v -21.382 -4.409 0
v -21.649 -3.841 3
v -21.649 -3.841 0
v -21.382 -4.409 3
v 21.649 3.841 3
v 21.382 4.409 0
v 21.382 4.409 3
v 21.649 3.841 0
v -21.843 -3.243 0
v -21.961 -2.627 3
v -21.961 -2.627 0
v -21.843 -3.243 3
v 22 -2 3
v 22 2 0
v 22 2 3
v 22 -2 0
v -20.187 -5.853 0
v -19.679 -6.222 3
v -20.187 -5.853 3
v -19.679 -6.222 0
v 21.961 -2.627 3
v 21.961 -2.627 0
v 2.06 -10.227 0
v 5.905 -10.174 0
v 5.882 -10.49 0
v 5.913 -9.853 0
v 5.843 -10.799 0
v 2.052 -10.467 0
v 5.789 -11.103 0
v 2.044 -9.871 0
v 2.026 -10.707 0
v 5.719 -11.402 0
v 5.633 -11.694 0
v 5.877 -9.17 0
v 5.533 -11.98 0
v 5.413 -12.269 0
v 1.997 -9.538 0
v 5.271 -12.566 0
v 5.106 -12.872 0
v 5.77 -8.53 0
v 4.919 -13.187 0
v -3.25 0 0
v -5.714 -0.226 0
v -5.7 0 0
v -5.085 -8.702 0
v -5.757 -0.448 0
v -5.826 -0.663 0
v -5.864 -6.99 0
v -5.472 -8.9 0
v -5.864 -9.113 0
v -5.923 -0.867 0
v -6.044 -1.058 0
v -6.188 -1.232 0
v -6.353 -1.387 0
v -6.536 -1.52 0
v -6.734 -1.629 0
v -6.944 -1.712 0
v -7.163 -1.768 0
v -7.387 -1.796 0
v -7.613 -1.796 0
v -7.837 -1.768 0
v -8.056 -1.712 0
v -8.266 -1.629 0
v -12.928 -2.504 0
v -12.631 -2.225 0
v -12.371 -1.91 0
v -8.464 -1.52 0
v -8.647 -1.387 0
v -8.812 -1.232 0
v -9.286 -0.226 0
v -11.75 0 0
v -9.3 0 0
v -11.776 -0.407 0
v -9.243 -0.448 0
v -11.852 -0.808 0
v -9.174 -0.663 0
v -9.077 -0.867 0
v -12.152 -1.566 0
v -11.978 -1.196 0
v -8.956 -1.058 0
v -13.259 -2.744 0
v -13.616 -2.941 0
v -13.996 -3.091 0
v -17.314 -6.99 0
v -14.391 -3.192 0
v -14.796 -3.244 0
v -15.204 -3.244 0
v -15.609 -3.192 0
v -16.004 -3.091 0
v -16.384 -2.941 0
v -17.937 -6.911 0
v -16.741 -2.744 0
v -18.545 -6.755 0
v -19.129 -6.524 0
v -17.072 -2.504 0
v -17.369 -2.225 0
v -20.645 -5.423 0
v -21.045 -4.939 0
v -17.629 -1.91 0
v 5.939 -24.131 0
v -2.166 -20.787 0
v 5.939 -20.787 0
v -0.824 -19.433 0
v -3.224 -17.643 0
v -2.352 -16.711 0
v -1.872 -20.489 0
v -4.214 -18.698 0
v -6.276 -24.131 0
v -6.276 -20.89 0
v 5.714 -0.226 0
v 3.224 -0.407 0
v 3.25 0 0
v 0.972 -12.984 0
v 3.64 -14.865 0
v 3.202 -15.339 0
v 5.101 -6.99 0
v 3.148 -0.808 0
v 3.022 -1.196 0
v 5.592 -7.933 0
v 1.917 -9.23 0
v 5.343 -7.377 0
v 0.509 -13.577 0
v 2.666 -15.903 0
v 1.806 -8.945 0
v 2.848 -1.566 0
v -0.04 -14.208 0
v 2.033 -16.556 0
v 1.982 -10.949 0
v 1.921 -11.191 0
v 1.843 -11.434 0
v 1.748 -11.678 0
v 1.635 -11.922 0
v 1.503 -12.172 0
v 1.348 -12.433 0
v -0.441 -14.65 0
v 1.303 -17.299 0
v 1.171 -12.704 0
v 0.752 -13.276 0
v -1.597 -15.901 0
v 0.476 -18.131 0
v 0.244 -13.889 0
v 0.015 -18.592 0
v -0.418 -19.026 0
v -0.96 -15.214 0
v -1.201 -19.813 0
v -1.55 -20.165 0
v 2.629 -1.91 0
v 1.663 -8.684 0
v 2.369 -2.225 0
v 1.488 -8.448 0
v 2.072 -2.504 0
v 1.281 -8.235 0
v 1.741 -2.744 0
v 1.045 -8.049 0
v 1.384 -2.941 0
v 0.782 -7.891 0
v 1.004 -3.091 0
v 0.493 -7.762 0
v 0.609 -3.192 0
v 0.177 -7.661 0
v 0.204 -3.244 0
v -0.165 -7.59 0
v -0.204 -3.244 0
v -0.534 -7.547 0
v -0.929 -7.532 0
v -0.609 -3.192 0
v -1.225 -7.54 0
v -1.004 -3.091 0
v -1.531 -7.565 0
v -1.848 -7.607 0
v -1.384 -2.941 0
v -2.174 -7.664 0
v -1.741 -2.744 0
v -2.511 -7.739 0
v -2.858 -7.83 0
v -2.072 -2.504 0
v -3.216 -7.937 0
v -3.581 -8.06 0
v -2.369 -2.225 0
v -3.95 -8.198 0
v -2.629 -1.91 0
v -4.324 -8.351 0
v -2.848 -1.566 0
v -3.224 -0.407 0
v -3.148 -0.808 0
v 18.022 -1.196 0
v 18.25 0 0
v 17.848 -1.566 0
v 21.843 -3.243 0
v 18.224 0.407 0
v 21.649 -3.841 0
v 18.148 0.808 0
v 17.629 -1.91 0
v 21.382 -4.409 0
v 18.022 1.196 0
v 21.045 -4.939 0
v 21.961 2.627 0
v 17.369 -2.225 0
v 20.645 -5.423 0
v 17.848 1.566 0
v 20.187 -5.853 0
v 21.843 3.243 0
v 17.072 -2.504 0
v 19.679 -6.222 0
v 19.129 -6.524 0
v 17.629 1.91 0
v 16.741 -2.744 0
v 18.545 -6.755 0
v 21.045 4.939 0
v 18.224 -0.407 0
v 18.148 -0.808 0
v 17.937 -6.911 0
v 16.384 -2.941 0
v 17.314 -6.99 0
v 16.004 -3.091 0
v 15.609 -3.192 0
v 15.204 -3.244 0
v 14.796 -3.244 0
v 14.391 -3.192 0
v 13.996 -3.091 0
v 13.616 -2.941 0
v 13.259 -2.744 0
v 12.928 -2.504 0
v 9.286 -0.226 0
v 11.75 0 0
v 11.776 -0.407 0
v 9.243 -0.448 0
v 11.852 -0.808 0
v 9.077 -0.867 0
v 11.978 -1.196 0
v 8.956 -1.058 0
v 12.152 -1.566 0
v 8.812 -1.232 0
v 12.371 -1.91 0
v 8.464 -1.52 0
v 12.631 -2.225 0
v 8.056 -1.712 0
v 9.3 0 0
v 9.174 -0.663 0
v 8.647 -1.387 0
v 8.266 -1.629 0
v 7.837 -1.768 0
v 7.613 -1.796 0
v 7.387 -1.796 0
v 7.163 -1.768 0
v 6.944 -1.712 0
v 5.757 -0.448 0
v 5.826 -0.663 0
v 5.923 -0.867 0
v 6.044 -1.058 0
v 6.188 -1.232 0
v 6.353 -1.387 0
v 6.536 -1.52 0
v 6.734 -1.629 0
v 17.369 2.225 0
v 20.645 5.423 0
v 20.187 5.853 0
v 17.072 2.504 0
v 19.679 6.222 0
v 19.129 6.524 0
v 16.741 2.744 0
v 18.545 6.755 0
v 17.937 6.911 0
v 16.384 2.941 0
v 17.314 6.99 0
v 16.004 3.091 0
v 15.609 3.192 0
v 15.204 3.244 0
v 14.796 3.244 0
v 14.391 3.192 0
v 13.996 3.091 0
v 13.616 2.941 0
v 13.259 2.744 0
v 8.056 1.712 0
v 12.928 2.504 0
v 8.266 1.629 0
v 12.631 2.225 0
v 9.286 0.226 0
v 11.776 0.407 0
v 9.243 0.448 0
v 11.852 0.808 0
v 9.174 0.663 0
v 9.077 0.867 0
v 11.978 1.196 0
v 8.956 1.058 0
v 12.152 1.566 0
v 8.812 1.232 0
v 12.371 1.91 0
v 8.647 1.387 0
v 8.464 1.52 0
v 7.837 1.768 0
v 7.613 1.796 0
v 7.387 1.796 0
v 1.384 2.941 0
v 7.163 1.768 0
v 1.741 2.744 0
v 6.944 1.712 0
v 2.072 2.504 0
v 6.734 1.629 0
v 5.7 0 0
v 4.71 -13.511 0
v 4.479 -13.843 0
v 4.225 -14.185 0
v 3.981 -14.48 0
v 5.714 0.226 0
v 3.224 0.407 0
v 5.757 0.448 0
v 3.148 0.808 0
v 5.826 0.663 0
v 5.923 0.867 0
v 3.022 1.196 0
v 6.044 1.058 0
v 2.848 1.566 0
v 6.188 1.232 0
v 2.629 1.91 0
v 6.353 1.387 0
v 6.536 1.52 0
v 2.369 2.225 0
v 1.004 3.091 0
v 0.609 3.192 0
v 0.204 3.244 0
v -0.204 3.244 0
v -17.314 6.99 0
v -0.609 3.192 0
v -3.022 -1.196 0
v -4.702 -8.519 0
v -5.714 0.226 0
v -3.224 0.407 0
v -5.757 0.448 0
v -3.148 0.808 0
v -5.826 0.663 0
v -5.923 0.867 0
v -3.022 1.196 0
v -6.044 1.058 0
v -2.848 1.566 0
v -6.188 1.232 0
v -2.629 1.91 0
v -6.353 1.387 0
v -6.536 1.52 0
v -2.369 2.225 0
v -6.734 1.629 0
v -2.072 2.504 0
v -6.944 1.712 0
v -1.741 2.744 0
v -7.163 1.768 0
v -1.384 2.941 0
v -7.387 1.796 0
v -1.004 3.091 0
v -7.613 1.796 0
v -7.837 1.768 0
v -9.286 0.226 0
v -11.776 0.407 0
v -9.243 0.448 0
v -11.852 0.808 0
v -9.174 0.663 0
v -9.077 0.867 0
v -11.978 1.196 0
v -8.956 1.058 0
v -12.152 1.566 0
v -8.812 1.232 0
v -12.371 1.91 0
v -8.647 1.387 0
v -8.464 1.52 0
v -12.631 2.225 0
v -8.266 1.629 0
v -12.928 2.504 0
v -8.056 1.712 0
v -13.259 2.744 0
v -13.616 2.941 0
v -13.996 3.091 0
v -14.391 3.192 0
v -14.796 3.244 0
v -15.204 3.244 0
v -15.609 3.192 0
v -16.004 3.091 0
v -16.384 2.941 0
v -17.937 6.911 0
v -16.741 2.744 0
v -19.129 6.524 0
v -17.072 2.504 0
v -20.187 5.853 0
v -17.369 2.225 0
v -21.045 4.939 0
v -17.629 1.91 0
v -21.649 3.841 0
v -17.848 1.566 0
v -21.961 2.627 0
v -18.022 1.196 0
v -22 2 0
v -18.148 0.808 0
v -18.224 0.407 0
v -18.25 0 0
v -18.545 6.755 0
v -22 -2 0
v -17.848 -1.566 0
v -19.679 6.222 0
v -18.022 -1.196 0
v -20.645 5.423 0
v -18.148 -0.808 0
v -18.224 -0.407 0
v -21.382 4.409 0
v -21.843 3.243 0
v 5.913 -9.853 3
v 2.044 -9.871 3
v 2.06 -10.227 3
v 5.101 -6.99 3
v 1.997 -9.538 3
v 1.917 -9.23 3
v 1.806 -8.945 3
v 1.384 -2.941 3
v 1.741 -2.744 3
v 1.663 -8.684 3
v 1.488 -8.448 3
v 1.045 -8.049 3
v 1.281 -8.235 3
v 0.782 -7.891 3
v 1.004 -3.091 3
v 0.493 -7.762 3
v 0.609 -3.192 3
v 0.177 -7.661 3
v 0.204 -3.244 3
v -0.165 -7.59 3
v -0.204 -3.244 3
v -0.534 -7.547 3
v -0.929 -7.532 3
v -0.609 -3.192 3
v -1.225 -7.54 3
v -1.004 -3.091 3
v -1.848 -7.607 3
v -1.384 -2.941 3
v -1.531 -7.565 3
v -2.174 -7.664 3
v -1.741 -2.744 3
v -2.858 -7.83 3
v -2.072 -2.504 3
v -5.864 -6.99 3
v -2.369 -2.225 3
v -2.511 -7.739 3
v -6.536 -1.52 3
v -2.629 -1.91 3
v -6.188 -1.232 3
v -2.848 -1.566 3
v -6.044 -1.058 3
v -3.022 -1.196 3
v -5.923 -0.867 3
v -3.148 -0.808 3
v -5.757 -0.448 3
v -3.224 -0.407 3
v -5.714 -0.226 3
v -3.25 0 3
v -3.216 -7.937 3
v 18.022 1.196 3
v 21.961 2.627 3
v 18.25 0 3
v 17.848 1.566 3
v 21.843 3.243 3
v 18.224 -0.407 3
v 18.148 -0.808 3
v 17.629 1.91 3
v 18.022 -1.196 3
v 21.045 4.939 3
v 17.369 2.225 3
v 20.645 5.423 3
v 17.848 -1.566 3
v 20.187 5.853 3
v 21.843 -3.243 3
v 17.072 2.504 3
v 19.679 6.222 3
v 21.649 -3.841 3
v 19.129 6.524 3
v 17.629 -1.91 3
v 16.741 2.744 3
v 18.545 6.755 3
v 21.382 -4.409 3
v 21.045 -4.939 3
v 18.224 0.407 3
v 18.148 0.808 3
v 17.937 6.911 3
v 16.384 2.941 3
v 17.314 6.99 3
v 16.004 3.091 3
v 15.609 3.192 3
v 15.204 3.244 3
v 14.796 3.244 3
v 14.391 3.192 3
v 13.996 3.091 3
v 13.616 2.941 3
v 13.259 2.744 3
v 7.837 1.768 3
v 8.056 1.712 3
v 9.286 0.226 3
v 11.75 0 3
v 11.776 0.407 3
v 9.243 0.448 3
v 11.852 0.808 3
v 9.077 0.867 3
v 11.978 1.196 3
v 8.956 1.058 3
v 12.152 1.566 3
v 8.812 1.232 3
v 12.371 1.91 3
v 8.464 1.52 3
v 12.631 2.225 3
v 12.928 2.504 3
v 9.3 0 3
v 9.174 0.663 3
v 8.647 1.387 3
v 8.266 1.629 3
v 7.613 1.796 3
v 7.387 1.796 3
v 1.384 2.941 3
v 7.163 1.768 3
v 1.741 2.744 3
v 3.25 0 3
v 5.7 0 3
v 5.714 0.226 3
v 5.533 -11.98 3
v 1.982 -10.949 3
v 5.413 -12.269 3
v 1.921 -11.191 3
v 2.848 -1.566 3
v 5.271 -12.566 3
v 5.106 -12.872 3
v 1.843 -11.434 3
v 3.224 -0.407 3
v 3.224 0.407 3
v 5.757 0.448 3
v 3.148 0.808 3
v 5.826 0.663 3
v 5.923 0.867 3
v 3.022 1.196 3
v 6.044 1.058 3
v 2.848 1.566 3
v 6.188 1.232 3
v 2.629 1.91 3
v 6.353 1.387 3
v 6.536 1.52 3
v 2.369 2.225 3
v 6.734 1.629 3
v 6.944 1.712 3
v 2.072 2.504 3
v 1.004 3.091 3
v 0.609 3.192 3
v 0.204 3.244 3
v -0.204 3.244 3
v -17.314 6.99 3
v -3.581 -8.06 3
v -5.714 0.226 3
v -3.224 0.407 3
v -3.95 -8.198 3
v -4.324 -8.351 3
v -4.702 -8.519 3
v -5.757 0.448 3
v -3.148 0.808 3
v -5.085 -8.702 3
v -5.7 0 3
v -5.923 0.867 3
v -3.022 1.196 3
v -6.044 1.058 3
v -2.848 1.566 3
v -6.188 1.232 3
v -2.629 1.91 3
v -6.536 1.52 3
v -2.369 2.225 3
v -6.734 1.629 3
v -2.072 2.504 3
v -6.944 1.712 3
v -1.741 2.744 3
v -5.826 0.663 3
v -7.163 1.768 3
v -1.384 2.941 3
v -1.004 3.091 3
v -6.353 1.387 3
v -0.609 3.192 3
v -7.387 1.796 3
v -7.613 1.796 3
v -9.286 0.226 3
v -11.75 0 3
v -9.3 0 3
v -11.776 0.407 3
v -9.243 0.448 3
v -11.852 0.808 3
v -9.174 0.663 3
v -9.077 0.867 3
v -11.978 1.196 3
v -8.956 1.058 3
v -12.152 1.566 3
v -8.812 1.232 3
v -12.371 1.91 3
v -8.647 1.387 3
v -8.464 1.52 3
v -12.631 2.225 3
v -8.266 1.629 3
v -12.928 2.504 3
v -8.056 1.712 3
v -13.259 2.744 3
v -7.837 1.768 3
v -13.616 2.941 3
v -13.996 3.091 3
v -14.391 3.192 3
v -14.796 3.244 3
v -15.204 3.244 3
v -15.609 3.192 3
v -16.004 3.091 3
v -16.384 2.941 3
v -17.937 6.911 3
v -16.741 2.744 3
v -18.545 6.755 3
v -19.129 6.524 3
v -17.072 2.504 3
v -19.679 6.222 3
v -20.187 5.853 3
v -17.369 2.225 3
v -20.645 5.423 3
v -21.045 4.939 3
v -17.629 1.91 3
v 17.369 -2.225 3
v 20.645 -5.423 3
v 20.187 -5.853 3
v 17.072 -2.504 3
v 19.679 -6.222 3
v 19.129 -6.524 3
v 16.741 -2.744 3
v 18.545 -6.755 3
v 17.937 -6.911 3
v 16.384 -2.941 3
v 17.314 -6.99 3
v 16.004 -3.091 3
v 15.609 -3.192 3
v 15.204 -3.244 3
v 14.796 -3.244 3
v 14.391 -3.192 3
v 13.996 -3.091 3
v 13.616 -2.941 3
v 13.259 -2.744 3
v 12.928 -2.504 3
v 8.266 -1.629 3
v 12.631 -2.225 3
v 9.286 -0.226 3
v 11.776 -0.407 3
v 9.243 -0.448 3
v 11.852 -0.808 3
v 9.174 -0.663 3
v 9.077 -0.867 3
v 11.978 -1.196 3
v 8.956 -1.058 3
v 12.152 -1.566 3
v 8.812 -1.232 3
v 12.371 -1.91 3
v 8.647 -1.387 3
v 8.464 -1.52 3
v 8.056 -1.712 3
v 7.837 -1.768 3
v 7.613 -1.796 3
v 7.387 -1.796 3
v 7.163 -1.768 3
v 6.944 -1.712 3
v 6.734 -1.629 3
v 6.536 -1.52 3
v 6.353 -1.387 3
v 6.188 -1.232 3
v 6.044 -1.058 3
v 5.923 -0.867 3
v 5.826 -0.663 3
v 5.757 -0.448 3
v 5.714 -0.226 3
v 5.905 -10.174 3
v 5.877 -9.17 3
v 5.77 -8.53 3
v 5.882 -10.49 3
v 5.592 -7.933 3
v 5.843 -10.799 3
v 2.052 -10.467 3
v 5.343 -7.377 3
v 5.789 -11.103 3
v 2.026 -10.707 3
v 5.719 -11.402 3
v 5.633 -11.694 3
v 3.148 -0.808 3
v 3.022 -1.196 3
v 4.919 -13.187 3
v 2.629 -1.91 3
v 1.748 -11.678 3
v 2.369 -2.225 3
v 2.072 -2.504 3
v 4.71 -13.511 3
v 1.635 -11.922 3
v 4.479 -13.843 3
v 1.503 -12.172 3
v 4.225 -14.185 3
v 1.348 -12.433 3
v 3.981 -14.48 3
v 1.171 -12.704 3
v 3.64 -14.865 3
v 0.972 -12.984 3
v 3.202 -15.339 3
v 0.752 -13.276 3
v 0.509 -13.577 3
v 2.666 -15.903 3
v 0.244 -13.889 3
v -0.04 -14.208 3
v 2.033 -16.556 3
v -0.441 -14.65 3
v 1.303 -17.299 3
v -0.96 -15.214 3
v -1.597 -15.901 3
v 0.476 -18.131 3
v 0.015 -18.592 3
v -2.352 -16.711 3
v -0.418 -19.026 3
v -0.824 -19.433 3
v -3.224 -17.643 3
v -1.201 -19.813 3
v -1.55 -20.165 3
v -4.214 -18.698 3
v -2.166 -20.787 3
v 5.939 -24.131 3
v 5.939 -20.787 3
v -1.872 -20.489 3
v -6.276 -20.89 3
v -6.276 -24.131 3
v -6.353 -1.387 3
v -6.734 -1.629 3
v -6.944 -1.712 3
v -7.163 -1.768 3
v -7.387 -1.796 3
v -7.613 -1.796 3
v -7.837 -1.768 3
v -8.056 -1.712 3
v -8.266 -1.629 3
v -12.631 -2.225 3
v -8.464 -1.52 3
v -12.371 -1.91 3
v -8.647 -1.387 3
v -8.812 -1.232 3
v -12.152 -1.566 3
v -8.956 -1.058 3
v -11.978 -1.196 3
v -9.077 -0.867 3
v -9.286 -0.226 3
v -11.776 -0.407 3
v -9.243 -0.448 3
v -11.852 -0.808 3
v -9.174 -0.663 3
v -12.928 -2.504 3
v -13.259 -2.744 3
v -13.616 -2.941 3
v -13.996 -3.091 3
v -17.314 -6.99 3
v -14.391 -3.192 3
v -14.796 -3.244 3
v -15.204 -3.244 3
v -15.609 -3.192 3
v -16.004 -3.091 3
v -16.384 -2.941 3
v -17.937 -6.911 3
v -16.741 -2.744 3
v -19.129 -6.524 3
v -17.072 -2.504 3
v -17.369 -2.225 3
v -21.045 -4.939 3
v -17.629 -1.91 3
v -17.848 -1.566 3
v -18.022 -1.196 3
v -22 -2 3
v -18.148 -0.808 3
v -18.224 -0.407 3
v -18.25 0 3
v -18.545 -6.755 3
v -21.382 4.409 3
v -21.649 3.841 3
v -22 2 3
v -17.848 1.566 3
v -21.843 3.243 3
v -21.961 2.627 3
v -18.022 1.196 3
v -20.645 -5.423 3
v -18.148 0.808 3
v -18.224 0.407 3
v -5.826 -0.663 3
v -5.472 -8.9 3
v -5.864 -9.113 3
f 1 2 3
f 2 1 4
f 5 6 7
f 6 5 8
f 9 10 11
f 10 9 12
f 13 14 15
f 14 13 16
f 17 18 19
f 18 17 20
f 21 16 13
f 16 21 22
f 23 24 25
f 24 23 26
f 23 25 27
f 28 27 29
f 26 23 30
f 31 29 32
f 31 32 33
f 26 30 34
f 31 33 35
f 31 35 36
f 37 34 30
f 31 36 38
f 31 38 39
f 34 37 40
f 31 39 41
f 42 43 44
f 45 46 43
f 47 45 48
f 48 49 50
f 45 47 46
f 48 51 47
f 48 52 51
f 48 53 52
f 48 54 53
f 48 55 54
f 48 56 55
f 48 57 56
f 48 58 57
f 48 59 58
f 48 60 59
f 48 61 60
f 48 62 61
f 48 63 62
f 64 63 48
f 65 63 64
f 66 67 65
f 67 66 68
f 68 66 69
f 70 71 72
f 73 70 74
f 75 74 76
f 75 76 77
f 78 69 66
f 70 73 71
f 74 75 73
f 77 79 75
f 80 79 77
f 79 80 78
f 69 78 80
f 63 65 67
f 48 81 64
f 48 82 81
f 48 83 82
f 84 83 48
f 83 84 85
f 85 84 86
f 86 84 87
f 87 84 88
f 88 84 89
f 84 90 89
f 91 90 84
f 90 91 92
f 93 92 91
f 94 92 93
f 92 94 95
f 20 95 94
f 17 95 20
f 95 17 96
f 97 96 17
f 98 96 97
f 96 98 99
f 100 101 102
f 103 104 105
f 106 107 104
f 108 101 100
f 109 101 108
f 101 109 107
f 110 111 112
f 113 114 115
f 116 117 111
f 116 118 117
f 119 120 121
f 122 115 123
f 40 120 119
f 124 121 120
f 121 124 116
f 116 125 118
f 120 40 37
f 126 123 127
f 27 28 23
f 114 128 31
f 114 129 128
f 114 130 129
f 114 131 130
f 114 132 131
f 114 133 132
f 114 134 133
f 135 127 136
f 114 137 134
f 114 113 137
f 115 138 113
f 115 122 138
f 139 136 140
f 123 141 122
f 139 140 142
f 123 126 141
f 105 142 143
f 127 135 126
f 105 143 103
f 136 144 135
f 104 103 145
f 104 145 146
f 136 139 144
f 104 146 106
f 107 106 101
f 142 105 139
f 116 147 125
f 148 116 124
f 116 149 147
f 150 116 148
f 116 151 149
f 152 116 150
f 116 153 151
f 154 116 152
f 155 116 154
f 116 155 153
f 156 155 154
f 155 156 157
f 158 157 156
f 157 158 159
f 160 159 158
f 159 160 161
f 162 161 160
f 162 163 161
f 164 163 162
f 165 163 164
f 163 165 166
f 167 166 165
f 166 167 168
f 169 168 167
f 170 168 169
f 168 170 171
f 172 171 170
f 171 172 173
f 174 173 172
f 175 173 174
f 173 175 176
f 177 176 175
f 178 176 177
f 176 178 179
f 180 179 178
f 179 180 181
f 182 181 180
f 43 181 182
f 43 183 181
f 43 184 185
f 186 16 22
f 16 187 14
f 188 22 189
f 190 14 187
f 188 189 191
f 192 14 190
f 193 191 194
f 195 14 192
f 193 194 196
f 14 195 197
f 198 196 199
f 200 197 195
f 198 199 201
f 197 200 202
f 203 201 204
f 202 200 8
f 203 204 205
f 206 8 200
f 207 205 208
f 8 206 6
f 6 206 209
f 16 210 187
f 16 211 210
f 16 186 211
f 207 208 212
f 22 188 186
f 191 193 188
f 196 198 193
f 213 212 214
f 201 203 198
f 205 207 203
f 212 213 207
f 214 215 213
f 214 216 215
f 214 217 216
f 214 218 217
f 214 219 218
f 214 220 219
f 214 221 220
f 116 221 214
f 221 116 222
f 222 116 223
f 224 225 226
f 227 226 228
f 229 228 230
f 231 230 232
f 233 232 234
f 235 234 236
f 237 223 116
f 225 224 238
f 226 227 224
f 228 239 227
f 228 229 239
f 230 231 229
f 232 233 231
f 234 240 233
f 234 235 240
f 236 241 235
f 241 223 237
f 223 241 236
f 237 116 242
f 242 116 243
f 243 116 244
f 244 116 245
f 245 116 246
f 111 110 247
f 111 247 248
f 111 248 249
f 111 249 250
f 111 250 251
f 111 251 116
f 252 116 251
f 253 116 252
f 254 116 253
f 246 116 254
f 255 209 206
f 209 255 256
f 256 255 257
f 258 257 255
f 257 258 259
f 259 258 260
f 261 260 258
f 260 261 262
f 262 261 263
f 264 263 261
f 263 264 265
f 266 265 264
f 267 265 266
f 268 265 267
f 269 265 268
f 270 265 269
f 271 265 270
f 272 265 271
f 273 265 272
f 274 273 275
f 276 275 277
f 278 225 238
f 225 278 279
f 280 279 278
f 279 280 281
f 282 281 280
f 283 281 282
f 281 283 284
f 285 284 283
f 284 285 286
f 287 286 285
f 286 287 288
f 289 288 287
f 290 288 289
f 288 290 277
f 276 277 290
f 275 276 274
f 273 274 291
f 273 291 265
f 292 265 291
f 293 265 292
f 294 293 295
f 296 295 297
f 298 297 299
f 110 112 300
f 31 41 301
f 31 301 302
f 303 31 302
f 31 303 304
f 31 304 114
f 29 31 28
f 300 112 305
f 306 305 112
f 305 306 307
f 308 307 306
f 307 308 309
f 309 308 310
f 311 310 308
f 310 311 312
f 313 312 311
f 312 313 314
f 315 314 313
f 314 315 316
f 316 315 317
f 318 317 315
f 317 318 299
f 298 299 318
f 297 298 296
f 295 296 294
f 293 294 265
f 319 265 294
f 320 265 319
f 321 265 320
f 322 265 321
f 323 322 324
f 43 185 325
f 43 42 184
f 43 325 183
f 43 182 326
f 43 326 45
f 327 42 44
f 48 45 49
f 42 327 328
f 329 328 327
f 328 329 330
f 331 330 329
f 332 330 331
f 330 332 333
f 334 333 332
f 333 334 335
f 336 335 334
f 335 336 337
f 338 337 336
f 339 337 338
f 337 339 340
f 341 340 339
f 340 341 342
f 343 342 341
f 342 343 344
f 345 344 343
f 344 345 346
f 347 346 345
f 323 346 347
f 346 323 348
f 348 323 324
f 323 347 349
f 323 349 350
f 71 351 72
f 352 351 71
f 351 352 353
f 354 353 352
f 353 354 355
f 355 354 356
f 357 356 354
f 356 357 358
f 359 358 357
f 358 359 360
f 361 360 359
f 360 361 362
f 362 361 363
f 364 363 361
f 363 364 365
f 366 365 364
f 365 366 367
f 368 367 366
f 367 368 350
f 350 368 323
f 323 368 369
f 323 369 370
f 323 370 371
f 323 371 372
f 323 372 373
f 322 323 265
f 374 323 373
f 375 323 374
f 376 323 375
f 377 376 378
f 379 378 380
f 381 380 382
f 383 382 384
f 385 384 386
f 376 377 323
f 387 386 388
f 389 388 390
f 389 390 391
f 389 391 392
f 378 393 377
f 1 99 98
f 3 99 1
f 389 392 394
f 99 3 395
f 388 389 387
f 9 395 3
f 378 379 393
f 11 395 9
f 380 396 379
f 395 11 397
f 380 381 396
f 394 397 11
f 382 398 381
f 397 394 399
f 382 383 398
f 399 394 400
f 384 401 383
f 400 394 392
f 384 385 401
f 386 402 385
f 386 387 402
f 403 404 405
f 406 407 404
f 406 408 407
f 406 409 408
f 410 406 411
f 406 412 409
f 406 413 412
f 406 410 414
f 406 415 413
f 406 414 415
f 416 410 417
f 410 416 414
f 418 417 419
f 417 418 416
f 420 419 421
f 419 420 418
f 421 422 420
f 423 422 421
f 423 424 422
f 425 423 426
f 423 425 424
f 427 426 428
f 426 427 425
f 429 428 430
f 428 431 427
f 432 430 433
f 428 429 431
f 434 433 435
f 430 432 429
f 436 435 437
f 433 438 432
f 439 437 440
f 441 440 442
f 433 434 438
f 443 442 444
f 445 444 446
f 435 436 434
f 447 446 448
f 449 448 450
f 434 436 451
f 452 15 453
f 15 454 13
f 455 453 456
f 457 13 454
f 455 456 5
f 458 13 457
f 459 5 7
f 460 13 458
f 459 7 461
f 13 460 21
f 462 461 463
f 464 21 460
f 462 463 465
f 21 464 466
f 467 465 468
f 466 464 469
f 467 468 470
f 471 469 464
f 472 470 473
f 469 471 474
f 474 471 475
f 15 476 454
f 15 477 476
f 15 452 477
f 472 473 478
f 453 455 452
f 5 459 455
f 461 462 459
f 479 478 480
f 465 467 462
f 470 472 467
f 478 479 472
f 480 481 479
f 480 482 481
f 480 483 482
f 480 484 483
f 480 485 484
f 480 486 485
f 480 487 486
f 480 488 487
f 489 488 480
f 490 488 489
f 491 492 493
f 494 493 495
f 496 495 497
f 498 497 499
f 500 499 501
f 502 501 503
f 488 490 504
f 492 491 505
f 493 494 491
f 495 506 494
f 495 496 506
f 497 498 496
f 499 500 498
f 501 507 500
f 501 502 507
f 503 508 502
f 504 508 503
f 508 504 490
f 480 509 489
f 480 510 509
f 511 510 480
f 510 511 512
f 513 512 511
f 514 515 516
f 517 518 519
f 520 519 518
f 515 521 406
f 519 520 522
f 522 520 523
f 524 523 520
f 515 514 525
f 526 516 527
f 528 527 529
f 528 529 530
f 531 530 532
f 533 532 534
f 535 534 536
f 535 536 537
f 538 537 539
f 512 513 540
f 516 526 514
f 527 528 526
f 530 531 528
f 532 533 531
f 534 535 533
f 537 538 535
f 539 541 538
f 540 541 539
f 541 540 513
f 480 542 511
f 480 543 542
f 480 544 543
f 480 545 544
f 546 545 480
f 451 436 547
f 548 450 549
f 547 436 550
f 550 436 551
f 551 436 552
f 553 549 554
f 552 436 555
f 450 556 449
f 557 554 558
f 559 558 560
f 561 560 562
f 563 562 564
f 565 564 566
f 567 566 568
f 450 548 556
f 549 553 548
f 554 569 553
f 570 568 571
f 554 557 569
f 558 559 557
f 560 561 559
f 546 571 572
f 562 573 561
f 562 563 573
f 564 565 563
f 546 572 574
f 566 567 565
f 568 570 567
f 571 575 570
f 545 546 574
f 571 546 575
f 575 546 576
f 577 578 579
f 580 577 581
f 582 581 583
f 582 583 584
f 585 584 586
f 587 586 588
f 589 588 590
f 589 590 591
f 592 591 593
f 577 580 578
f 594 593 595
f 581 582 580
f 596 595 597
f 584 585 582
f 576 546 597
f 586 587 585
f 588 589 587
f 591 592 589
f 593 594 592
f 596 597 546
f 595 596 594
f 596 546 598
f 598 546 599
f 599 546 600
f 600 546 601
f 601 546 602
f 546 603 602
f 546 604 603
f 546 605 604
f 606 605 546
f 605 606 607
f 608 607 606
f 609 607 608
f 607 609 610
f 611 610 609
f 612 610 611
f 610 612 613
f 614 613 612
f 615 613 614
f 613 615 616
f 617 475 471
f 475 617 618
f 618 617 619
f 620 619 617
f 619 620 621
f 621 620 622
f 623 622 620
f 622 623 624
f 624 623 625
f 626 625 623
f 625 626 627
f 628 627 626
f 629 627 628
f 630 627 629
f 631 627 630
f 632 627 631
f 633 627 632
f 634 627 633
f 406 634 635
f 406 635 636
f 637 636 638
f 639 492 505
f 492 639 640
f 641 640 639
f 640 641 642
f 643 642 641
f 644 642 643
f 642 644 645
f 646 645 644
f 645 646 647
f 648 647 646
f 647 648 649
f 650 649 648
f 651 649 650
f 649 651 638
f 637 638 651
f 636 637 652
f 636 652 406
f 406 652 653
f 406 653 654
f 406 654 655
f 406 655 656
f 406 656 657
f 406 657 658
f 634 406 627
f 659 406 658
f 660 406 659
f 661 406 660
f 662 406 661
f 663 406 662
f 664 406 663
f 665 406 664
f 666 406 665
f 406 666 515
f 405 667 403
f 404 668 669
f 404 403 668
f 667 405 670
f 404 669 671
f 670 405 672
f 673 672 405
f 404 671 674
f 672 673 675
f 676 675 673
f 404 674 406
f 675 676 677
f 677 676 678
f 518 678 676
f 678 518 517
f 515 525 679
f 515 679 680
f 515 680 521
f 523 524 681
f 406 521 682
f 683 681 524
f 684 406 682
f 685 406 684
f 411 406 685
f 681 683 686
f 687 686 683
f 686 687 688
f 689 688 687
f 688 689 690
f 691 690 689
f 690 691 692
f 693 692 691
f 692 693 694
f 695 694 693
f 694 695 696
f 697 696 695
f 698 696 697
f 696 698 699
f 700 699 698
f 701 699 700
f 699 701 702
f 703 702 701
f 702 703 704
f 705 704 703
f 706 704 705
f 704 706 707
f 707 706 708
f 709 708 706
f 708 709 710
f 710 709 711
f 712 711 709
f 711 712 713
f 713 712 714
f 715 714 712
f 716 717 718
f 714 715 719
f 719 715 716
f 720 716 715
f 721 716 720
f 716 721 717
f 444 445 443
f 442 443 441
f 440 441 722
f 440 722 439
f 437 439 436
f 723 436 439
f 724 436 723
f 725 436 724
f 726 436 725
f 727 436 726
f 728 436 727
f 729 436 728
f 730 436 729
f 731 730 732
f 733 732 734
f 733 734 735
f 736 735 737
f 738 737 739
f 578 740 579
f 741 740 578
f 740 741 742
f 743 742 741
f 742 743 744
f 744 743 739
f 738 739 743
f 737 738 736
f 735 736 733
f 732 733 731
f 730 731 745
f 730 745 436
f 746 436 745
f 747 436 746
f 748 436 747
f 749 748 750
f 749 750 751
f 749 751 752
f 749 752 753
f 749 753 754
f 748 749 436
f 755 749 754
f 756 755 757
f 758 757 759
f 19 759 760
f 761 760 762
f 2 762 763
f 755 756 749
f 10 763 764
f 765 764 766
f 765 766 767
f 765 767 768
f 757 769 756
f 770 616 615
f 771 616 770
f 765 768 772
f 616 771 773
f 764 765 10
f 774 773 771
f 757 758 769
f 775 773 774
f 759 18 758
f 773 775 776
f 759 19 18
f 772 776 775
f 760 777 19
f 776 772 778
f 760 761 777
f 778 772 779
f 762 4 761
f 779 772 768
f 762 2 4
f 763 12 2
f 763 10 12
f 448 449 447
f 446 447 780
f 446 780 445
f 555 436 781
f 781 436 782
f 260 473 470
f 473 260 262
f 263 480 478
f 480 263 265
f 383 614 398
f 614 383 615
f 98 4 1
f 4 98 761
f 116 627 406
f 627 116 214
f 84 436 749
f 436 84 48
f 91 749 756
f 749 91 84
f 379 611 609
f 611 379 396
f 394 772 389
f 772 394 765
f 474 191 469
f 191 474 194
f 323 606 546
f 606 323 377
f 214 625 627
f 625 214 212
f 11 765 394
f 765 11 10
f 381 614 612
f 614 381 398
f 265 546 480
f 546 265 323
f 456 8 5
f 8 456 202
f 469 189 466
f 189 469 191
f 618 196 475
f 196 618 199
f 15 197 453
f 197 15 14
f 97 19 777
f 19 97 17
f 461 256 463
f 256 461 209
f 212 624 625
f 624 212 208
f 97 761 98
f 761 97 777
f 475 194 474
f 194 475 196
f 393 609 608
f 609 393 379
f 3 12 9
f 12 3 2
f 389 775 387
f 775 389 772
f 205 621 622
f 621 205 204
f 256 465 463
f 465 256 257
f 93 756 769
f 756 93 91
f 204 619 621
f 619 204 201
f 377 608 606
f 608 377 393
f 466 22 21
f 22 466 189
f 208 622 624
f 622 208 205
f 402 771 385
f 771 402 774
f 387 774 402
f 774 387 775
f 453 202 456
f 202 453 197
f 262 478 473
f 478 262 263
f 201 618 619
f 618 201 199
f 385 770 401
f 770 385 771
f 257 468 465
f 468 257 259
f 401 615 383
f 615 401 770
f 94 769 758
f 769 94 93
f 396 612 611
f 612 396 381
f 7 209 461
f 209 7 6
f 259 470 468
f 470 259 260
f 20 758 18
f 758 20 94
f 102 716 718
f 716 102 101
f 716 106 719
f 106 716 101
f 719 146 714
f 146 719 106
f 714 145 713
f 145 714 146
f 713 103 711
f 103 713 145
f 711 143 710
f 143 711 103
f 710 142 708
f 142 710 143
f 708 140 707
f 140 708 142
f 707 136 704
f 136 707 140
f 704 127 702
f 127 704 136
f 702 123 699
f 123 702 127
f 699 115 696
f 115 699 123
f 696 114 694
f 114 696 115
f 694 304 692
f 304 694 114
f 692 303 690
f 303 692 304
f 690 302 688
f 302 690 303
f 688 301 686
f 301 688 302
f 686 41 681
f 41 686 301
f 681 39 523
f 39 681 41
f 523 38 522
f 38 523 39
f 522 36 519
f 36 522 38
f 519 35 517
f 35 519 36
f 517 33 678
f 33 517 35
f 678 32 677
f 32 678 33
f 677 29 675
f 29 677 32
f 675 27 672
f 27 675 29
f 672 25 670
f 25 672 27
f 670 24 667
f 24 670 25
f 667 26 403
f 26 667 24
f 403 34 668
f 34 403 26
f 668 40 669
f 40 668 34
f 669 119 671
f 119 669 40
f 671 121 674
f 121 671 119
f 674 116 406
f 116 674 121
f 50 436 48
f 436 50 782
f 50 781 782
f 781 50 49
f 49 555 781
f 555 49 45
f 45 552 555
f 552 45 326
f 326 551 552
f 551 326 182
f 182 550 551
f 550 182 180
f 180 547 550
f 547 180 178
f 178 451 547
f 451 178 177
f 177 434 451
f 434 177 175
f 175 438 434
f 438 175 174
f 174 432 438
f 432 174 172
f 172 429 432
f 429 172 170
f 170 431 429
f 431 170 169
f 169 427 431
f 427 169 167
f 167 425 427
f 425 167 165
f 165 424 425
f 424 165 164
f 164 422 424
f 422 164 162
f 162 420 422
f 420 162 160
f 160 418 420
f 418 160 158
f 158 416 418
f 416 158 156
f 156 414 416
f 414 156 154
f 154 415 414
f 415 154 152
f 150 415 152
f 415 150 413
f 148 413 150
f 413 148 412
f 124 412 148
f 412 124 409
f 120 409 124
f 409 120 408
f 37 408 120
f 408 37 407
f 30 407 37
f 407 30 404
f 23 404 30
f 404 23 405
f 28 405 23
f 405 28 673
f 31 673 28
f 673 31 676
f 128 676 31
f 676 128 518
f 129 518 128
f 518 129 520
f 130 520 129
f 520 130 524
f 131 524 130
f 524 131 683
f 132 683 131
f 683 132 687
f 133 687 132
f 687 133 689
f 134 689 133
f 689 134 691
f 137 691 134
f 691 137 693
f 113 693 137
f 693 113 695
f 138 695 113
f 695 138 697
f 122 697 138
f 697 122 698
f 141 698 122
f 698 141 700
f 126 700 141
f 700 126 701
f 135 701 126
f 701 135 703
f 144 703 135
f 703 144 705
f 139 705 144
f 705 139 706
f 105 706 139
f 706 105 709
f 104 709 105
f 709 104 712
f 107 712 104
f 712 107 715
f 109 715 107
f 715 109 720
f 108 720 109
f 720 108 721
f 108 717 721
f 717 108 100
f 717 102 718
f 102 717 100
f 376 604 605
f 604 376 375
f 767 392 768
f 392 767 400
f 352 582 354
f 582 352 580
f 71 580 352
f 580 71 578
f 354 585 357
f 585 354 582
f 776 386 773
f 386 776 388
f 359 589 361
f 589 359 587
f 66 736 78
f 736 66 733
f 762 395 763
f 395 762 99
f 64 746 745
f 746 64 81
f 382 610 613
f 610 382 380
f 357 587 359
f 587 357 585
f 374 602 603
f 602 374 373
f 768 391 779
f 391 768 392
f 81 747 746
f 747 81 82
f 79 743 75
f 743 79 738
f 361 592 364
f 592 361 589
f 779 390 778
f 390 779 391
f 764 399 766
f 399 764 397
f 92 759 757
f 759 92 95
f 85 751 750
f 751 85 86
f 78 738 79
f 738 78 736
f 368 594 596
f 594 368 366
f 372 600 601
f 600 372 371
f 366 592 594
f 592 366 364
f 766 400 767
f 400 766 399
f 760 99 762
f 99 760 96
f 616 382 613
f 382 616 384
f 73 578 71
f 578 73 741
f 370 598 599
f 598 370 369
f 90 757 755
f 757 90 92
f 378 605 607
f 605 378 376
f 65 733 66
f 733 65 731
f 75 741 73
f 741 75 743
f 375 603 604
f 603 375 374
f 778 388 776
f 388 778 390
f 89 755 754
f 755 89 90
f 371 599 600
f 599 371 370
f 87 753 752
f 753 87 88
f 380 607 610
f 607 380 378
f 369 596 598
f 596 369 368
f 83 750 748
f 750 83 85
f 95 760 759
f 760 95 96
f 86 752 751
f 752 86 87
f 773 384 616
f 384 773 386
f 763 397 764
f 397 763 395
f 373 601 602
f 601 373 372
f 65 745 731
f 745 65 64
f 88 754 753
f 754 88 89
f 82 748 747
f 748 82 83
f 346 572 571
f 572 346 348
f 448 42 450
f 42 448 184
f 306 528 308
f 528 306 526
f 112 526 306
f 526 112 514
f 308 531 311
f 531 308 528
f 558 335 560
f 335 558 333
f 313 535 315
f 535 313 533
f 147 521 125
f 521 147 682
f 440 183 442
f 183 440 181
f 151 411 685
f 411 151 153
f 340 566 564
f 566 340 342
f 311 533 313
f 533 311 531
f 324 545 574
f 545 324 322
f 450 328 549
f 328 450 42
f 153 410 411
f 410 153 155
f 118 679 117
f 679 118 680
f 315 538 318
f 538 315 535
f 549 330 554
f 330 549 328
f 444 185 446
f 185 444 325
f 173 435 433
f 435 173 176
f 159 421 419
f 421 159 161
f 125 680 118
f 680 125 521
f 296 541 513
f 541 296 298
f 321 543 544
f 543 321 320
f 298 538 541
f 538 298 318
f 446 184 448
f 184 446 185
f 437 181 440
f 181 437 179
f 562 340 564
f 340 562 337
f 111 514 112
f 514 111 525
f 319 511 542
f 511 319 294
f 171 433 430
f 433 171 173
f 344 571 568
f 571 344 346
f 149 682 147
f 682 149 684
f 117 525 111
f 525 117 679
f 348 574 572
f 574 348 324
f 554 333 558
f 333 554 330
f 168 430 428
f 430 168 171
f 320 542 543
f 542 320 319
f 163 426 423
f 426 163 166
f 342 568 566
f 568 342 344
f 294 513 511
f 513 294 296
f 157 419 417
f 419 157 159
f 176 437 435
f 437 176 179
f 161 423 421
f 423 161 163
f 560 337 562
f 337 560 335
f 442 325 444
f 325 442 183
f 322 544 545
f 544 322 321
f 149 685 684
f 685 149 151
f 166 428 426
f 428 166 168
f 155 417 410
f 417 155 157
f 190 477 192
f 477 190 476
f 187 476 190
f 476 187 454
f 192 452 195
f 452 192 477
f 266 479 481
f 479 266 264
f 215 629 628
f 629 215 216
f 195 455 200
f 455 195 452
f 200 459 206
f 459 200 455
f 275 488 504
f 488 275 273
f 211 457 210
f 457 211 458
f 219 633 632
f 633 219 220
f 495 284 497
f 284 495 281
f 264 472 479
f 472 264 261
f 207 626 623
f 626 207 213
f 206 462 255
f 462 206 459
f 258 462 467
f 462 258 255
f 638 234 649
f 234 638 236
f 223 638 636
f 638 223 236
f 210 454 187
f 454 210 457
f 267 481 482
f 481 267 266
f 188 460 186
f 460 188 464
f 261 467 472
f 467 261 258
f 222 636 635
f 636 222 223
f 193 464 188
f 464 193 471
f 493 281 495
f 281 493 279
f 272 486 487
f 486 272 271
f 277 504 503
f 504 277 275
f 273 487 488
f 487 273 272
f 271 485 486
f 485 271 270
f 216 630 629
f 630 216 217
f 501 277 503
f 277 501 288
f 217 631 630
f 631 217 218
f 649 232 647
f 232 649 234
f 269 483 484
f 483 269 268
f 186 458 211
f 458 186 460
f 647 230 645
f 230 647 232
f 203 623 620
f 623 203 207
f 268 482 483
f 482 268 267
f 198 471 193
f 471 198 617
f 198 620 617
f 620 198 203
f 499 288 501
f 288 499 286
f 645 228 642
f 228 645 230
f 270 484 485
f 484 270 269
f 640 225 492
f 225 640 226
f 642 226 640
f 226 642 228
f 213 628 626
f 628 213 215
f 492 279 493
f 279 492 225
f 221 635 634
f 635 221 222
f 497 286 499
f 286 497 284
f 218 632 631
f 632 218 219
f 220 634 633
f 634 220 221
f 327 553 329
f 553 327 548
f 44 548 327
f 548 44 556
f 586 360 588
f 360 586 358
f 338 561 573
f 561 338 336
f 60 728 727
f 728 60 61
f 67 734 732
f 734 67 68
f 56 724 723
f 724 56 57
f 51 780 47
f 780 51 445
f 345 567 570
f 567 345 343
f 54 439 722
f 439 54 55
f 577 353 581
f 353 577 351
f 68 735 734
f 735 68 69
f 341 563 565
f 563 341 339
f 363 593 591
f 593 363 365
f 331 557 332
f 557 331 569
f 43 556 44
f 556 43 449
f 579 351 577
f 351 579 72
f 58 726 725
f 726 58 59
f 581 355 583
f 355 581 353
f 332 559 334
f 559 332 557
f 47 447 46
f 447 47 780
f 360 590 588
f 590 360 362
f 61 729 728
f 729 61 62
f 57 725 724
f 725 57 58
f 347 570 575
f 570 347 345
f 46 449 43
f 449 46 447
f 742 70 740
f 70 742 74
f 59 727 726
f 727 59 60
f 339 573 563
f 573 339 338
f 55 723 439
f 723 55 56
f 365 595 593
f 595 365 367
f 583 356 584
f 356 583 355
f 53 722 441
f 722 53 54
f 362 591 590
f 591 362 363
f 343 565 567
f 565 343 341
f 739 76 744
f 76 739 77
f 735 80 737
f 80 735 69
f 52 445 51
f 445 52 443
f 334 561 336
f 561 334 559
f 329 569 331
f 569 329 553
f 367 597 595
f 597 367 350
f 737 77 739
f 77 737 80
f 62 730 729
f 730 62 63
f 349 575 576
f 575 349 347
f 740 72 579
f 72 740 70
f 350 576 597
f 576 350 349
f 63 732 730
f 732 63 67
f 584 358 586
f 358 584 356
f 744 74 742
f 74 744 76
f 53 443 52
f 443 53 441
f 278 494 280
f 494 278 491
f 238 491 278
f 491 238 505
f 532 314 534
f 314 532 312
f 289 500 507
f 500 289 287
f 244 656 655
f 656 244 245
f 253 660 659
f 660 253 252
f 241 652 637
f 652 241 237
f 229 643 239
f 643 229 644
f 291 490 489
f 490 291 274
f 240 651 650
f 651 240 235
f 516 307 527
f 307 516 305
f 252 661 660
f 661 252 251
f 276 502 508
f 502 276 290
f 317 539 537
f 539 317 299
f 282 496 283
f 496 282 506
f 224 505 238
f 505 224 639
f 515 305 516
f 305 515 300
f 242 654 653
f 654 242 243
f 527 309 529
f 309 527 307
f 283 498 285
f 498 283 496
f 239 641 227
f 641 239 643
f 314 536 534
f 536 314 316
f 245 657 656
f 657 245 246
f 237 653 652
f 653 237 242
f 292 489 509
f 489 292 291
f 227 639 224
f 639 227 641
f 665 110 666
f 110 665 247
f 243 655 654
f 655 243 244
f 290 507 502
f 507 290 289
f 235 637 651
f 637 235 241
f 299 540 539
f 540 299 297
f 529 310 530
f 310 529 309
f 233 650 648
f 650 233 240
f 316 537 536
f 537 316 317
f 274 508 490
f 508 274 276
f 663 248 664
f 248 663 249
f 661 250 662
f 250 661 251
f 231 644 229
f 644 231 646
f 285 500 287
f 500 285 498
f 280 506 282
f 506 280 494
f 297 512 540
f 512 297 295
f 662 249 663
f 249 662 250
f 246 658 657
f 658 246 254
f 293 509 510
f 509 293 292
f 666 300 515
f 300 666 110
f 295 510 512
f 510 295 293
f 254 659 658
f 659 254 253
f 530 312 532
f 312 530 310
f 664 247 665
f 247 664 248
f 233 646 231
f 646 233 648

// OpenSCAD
$fn = 50;


difference() {
	union() {
		hull() {
			translate(v = [-17.0000000000, 2.0000000000, 0]) {
				cylinder(h = 3, r = 5);
			}
			translate(v = [17.0000000000, 2.0000000000, 0]) {
				cylinder(h = 3, r = 5);
			}
			translate(v = [-17.0000000000, -2.0000000000, 0]) {
				cylinder(h = 3, r = 5);
			}
			translate(v = [17.0000000000, -2.0000000000, 0]) {
				cylinder(h = 3, r = 5);
			}
		}
		translate(v = [0, -5, 0]) {
			linear_extrude(height = 3) {
				text(font = "DejaVu Sans Mono:style=Bold", halign = "center", size = 19.0000000000, text = "2", valign = "top");
			}
		}
	}
	union() {
		translate(v = [-15.0000000000, 0.0000000000, 0]) {
			translate(v = [0, 0, -100]) {
				cylinder(h = 200, r = 3.2500000000);
			}
		}
		translate(v = [0, 0, -100]) {
			cylinder(h = 200, r = 3.2500000000);
		}
		translate(v = [15.0000000000, 0.0000000000, 0]) {
			translate(v = [0, 0, -100]) {
				cylinder(h = 200, r = 3.2500000000);
			}
		}
		translate(v = [-15.0000000000, 0.0000000000, 0]) {
			translate(v = [0, 0, -100]) {
				cylinder(h = 200, r = 1.8000000000);
			}
		}
		translate(v = [-7.5000000000, 0.0000000000, 0]) {
			translate(v = [0, 0, -100]) {
				cylinder(h = 200, r = 1.8000000000);
			}
		}
		translate(v = [0, 0, -100]) {
			cylinder(h = 200, r = 1.8000000000);
		}
		translate(v = [7.5000000000, 0.0000000000, 0]) {
			translate(v = [0, 0, -100]) {
				cylinder(h = 200, r = 1.8000000000);
			}
		}
		translate(v = [15.0000000000, 0.0000000000, 0]) {
			translate(v = [0, 0, -100]) {
				cylinder(h = 200, r = 1.8000000000);
			}
		}
	}
}
